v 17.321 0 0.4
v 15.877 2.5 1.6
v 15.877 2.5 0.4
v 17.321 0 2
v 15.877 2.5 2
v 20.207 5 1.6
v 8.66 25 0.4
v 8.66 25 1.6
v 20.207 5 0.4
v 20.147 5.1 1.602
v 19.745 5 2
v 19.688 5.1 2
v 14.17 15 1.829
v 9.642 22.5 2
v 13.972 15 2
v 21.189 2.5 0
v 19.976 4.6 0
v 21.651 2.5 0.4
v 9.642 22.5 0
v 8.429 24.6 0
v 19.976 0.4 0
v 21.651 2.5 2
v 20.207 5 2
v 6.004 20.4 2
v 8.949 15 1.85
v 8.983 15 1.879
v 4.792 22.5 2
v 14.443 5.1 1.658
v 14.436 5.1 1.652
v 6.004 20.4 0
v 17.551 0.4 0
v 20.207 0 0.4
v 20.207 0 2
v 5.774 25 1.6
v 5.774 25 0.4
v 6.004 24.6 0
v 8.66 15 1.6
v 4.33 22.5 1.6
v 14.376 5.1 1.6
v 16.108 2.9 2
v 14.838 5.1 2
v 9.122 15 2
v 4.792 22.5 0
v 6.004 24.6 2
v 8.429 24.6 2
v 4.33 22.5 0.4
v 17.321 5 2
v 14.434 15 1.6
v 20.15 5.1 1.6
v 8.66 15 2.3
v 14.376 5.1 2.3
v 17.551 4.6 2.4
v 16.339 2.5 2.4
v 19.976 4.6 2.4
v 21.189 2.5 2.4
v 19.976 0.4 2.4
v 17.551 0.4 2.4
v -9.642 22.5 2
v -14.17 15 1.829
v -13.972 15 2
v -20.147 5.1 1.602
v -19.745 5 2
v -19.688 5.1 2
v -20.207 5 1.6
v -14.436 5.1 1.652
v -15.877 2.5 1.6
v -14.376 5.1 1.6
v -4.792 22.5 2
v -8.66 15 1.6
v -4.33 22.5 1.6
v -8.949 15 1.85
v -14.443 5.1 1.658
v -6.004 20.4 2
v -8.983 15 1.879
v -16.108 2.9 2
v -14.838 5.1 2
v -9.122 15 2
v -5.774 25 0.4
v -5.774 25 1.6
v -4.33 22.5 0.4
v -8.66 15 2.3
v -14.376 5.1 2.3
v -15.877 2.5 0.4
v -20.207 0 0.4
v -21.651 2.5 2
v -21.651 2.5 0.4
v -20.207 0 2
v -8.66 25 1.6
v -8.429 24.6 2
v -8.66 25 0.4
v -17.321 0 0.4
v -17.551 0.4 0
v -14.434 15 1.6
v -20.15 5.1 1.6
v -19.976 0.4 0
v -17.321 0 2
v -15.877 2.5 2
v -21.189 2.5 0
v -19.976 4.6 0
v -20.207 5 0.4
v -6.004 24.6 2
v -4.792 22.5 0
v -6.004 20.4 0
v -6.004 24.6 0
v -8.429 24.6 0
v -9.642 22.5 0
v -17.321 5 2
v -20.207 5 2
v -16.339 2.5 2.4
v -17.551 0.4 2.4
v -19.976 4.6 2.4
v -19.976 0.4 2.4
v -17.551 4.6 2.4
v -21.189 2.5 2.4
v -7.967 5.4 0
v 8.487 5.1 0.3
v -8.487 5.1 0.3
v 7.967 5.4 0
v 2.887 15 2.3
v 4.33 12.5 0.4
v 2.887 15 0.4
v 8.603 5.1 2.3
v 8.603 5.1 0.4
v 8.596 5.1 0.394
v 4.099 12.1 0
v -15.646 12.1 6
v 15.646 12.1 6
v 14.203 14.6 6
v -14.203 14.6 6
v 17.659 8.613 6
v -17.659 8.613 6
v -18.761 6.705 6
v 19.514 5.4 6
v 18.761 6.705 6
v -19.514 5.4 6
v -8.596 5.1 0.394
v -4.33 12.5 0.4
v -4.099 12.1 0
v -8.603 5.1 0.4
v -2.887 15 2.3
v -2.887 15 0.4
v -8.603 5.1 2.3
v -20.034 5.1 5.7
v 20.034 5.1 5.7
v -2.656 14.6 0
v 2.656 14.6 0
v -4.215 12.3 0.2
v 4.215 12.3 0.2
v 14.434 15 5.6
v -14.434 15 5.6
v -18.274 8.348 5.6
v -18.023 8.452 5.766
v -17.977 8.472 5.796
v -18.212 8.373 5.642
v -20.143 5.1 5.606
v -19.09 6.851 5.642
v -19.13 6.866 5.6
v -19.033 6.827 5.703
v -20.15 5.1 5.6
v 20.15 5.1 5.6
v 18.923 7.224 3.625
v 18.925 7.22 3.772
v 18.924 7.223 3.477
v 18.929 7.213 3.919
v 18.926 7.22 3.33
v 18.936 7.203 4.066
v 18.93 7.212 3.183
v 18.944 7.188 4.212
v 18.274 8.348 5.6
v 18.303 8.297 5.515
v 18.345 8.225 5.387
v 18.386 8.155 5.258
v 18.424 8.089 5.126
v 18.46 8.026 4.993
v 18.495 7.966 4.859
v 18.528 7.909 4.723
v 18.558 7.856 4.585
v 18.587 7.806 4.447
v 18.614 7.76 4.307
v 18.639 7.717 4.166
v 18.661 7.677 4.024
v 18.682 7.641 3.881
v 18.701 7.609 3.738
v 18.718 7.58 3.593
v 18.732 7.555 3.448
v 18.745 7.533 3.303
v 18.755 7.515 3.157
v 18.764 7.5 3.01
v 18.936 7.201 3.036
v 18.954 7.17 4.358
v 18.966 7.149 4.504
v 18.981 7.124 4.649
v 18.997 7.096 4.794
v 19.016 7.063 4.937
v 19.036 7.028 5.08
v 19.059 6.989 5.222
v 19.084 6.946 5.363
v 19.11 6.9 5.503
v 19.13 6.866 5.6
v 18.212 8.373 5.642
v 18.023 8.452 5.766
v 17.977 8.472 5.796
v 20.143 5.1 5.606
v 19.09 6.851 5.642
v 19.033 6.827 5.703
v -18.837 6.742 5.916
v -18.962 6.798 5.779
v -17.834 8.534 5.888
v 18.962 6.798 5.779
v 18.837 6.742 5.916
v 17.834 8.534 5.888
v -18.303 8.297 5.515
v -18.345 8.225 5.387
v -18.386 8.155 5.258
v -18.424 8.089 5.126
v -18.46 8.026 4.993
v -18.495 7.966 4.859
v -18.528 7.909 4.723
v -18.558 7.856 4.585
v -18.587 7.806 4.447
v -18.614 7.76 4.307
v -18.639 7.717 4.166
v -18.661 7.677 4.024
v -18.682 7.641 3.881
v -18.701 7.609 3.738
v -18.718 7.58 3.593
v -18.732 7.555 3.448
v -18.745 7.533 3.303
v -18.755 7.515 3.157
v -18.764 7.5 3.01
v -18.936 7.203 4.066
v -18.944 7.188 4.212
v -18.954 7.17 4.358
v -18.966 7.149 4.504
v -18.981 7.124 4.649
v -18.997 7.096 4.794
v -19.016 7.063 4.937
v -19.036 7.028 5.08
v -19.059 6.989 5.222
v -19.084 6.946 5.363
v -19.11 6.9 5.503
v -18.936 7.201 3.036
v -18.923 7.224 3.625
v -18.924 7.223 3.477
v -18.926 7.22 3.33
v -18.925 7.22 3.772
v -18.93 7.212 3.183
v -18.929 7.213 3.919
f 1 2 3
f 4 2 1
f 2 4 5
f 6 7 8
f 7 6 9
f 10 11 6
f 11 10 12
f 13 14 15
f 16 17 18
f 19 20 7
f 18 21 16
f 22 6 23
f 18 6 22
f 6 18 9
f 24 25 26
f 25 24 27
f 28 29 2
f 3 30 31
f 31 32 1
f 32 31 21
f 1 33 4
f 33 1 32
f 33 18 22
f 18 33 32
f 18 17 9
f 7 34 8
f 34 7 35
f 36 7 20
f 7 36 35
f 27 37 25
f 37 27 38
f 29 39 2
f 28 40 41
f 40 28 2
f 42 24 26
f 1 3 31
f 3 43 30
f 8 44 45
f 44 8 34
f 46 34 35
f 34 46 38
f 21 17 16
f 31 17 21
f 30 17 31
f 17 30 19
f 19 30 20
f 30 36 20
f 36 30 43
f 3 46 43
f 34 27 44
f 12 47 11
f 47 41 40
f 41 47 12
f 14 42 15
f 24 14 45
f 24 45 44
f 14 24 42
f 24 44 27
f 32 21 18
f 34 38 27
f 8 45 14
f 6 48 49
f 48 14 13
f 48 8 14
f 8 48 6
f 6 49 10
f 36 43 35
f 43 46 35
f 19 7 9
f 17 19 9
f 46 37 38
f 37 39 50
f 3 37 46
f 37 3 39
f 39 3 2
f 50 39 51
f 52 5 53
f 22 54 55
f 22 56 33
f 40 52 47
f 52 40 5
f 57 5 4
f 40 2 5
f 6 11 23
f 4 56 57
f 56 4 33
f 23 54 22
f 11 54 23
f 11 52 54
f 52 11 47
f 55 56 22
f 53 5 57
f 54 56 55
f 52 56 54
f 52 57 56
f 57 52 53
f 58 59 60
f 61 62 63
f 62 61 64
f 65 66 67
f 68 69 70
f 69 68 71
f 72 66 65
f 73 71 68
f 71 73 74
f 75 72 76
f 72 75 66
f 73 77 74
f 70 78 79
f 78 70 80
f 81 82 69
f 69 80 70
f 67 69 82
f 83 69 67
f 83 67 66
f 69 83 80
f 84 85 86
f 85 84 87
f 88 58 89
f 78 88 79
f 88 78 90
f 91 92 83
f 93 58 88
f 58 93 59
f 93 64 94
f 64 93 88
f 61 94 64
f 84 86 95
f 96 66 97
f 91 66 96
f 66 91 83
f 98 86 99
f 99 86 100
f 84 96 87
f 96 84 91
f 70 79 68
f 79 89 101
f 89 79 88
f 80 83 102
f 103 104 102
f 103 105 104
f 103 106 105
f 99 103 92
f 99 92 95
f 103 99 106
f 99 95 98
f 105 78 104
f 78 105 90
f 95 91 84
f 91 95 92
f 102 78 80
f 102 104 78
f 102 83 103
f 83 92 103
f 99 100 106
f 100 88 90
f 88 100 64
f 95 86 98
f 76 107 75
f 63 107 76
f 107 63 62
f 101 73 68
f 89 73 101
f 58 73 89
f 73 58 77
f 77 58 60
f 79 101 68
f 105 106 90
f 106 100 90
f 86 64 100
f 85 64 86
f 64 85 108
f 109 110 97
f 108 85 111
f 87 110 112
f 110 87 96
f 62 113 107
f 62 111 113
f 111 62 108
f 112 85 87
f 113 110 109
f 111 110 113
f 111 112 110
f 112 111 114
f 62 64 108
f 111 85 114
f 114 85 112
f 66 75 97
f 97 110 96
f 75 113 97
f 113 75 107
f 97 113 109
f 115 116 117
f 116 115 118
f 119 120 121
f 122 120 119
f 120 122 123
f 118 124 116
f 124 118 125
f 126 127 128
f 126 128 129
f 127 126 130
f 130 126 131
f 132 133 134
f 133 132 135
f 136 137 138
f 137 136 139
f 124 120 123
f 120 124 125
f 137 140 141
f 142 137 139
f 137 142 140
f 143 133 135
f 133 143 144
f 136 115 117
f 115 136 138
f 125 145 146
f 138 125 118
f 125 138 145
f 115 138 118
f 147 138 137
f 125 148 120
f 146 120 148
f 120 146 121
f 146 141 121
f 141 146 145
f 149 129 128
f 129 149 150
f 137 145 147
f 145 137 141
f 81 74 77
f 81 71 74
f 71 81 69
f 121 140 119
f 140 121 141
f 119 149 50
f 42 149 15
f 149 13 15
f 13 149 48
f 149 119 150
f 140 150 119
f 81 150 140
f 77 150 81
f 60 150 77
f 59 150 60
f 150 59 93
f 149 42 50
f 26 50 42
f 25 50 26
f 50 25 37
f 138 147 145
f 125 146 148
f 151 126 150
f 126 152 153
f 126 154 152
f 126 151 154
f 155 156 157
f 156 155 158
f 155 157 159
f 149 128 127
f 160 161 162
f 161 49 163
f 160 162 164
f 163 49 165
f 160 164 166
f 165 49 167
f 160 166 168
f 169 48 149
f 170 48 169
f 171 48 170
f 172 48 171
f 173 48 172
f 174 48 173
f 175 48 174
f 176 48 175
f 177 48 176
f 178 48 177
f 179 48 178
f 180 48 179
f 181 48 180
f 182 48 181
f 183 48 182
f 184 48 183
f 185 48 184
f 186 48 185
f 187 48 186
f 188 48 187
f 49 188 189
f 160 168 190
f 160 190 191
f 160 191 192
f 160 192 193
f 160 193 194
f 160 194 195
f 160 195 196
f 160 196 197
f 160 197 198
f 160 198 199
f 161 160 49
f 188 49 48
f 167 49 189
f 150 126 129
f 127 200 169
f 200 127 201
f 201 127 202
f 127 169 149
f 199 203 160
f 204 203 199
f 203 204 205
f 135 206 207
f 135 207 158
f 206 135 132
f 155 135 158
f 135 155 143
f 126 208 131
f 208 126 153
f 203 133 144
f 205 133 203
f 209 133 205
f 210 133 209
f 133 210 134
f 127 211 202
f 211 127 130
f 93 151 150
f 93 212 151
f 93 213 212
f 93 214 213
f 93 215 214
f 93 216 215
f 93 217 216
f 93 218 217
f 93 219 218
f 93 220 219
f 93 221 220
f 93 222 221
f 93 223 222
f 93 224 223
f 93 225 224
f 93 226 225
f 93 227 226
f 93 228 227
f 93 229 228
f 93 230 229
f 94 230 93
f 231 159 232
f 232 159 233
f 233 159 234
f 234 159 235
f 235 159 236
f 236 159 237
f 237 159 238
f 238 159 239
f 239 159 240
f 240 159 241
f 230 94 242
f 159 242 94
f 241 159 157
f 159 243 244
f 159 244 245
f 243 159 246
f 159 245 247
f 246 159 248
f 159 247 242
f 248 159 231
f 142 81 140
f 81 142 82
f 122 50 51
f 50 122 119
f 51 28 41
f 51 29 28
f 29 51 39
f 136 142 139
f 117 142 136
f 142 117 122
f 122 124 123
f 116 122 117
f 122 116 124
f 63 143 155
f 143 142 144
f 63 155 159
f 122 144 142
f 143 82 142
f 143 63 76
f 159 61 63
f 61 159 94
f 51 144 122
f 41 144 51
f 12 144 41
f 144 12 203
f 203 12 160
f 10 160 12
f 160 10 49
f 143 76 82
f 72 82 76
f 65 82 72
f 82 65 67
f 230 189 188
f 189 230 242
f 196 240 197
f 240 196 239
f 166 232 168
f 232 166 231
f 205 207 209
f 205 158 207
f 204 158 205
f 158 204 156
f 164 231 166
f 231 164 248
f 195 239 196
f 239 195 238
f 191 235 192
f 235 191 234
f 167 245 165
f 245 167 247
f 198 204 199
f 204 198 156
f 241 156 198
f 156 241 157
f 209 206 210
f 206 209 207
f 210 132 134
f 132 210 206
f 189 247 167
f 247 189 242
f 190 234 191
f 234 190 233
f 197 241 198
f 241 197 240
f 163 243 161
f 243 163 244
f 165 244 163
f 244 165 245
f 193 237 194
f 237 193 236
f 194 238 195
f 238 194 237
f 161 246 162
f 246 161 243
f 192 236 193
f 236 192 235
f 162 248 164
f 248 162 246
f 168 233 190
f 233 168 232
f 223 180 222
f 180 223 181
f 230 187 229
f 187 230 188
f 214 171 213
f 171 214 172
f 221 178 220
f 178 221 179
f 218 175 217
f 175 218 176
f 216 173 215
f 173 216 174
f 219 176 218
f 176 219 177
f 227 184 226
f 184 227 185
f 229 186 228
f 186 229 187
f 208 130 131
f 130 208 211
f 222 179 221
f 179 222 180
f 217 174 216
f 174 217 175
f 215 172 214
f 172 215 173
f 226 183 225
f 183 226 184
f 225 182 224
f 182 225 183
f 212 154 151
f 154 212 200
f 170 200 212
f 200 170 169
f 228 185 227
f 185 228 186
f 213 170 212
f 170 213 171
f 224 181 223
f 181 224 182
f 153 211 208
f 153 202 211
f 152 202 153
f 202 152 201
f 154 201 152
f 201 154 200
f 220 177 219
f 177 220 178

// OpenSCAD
$fn=256;$fa=6;


difference() {
	union() {
		union() {
			hull() {
				union() {
					translate(v = [-18.7638837487, 2.5000000000, 0]) {
						translate(v = [0, 0, 1.0000000000]) {
							hull() {
								hull() {
									rotate(a = [0, 0, 0]) {
										cube(center = true, size = [2.886751345948129, 5, 1.2000000000]);
									}
									rotate(a = [0, 0, 120]) {
										cube(center = true, size = [2.886751345948129, 5, 1.2000000000]);
									}
									rotate(a = [0, 0, 240]) {
										cube(center = true, size = [2.886751345948129, 5, 1.2000000000]);
									}
								}
								hull() {
									rotate(a = [0, 0, 0]) {
										cube(center = true, size = [2.424871130596429, 4.2000000000, 2]);
									}
									rotate(a = [0, 0, 120]) {
										cube(center = true, size = [2.424871130596429, 4.2000000000, 2]);
									}
									rotate(a = [0, 0, 240]) {
										cube(center = true, size = [2.424871130596429, 4.2000000000, 2]);
									}
								}
							}
						}
					}
					translate(v = [-7.2168783649, 22.5000000000, 0]) {
						translate(v = [0, 0, 1.0000000000]) {
							hull() {
								hull() {
									rotate(a = [0, 0, 0]) {
										cube(center = true, size = [2.886751345948129, 5, 1.2000000000]);
									}
									rotate(a = [0, 0, 120]) {
										cube(center = true, size = [2.886751345948129, 5, 1.2000000000]);
									}
									rotate(a = [0, 0, 240]) {
										cube(center = true, size = [2.886751345948129, 5, 1.2000000000]);
									}
								}
								hull() {
									rotate(a = [0, 0, 0]) {
										cube(center = true, size = [2.424871130596429, 4.2000000000, 2]);
									}
									rotate(a = [0, 0, 120]) {
										cube(center = true, size = [2.424871130596429, 4.2000000000, 2]);
									}
									rotate(a = [0, 0, 240]) {
										cube(center = true, size = [2.424871130596429, 4.2000000000, 2]);
									}
								}
							}
						}
					}
				}
			}
			translate(v = [0, 0, 0.4000000000]) {
				translate(v = [-18.7638837487, 2.5000000000, 0]) {
					translate(v = [0, 0, 1.0000000000]) {
						hull() {
							hull() {
								rotate(a = [0, 0, 0]) {
									cube(center = true, size = [2.886751345948129, 5, 1.2000000000]);
								}
								rotate(a = [0, 0, 120]) {
									cube(center = true, size = [2.886751345948129, 5, 1.2000000000]);
								}
								rotate(a = [0, 0, 240]) {
									cube(center = true, size = [2.886751345948129, 5, 1.2000000000]);
								}
							}
							hull() {
								rotate(a = [0, 0, 0]) {
									cube(center = true, size = [2.424871130596429, 4.2000000000, 2]);
								}
								rotate(a = [0, 0, 120]) {
									cube(center = true, size = [2.424871130596429, 4.2000000000, 2]);
								}
								rotate(a = [0, 0, 240]) {
									cube(center = true, size = [2.424871130596429, 4.2000000000, 2]);
								}
							}
						}
					}
				}
			}
			union() {
				hull() {
					union() {
						translate(v = [18.7638837487, 2.5000000000, 0]) {
							translate(v = [0, 0, 1.0000000000]) {
								hull() {
									hull() {
										rotate(a = [0, 0, 0]) {
											cube(center = true, size = [2.886751345948129, 5, 1.2000000000]);
										}
										rotate(a = [0, 0, 120]) {
											cube(center = true, size = [2.886751345948129, 5, 1.2000000000]);
										}
										rotate(a = [0, 0, 240]) {
											cube(center = true, size = [2.886751345948129, 5, 1.2000000000]);
										}
									}
									hull() {
										rotate(a = [0, 0, 0]) {
											cube(center = true, size = [2.424871130596429, 4.2000000000, 2]);
										}
										rotate(a = [0, 0, 120]) {
											cube(center = true, size = [2.424871130596429, 4.2000000000, 2]);
										}
										rotate(a = [0, 0, 240]) {
											cube(center = true, size = [2.424871130596429, 4.2000000000, 2]);
										}
									}
								}
							}
						}
						translate(v = [7.2168783649, 22.5000000000, 0]) {
							translate(v = [0, 0, 1.0000000000]) {
								hull() {
									hull() {
										rotate(a = [0, 0, 0]) {
											cube(center = true, size = [2.886751345948129, 5, 1.2000000000]);
										}
										rotate(a = [0, 0, 120]) {
											cube(center = true, size = [2.886751345948129, 5, 1.2000000000]);
										}
										rotate(a = [0, 0, 240]) {
											cube(center = true, size = [2.886751345948129, 5, 1.2000000000]);
										}
									}
									hull() {
										rotate(a = [0, 0, 0]) {
											cube(center = true, size = [2.424871130596429, 4.2000000000, 2]);
										}
										rotate(a = [0, 0, 120]) {
											cube(center = true, size = [2.424871130596429, 4.2000000000, 2]);
										}
										rotate(a = [0, 0, 240]) {
											cube(center = true, size = [2.424871130596429, 4.2000000000, 2]);
										}
									}
								}
							}
						}
					}
				}
				translate(v = [0, 0, 0.4000000000]) {
					translate(v = [18.7638837487, 2.5000000000, 0]) {
						translate(v = [0, 0, 1.0000000000]) {
							hull() {
								hull() {
									rotate(a = [0, 0, 0]) {
										cube(center = true, size = [2.886751345948129, 5, 1.2000000000]);
									}
									rotate(a = [0, 0, 120]) {
										cube(center = true, size = [2.886751345948129, 5, 1.2000000000]);
									}
									rotate(a = [0, 0, 240]) {
										cube(center = true, size = [2.886751345948129, 5, 1.2000000000]);
									}
								}
								hull() {
									rotate(a = [0, 0, 0]) {
										cube(center = true, size = [2.424871130596429, 4.2000000000, 2]);
									}
									rotate(a = [0, 0, 120]) {
										cube(center = true, size = [2.424871130596429, 4.2000000000, 2]);
									}
									rotate(a = [0, 0, 240]) {
										cube(center = true, size = [2.424871130596429, 4.2000000000, 2]);
									}
								}
							}
						}
					}
				}
			}
		}
		intersection() {
			union() {
				intersection() {
					hull() {
						translate(v = [-11.5470053838, 0, 0]) {
							union() {
								translate(v = [0, 5, 3.0000000000]) {
									hull() {
										intersection() {
											hull() {
												rotate(a = [0, 0, 0]) {
													cube(center = true, size = [8.660254037844387, 15, 5.2000000000]);
												}
												rotate(a = [0, 0, 120]) {
													cube(center = true, size = [8.660254037844387, 15, 5.2000000000]);
												}
												rotate(a = [0, 0, 240]) {
													cube(center = true, size = [8.660254037844387, 15, 5.2000000000]);
												}
											}
											translate(v = [0, 15.0000000000, 0]) {
												cube(center = true, size = 30);
											}
										}
										intersection() {
											hull() {
												rotate(a = [0, 0, 0]) {
													cube(center = true, size = [8.198373822492687, 14.2000000000, 6]);
												}
												rotate(a = [0, 0, 120]) {
													cube(center = true, size = [8.198373822492687, 14.2000000000, 6]);
												}
												rotate(a = [0, 0, 240]) {
													cube(center = true, size = [8.198373822492687, 14.2000000000, 6]);
												}
											}
											translate(v = [0, 15.4000000000, 0]) {
												cube(center = true, size = 30);
											}
										}
									}
								}
								translate(v = [0, 10, 3.0000000000]) {
									hull() {
										intersection() {
											hull() {
												rotate(a = [0, 0, 0]) {
													cube(center = true, size = [5.773502691896258, 10.0000000000, 5.2000000000]);
												}
												rotate(a = [0, 0, 120]) {
													cube(center = true, size = [5.773502691896258, 10.0000000000, 5.2000000000]);
												}
												rotate(a = [0, 0, 240]) {
													cube(center = true, size = [5.773502691896258, 10.0000000000, 5.2000000000]);
												}
											}
											translate(v = [0, 10.0000000000, 0]) {
												cube(center = true, size = 20.0000000000);
											}
										}
										intersection() {
											hull() {
												rotate(a = [0, 0, 0]) {
													cube(center = true, size = [5.311622476544557, 9.2000000000, 6]);
												}
												rotate(a = [0, 0, 120]) {
													cube(center = true, size = [5.311622476544557, 9.2000000000, 6]);
												}
												rotate(a = [0, 0, 240]) {
													cube(center = true, size = [5.311622476544557, 9.2000000000, 6]);
												}
											}
											translate(v = [0, 10.4000000000, 0]) {
												cube(center = true, size = 20.0000000000);
											}
										}
									}
								}
							}
						}
						translate(v = [11.5470053838, 0, 0]) {
							union() {
								translate(v = [0, 5, 3.0000000000]) {
									hull() {
										intersection() {
											hull() {
												rotate(a = [0, 0, 0]) {
													cube(center = true, size = [8.660254037844387, 15, 5.2000000000]);
												}
												rotate(a = [0, 0, 120]) {
													cube(center = true, size = [8.660254037844387, 15, 5.2000000000]);
												}
												rotate(a = [0, 0, 240]) {
													cube(center = true, size = [8.660254037844387, 15, 5.2000000000]);
												}
											}
											translate(v = [0, 15.0000000000, 0]) {
												cube(center = true, size = 30);
											}
										}
										intersection() {
											hull() {
												rotate(a = [0, 0, 0]) {
													cube(center = true, size = [8.198373822492687, 14.2000000000, 6]);
												}
												rotate(a = [0, 0, 120]) {
													cube(center = true, size = [8.198373822492687, 14.2000000000, 6]);
												}
												rotate(a = [0, 0, 240]) {
													cube(center = true, size = [8.198373822492687, 14.2000000000, 6]);
												}
											}
											translate(v = [0, 15.4000000000, 0]) {
												cube(center = true, size = 30);
											}
										}
									}
								}
								translate(v = [0, 10, 3.0000000000]) {
									hull() {
										intersection() {
											hull() {
												rotate(a = [0, 0, 0]) {
													cube(center = true, size = [5.773502691896258, 10.0000000000, 5.2000000000]);
												}
												rotate(a = [0, 0, 120]) {
													cube(center = true, size = [5.773502691896258, 10.0000000000, 5.2000000000]);
												}
												rotate(a = [0, 0, 240]) {
													cube(center = true, size = [5.773502691896258, 10.0000000000, 5.2000000000]);
												}
											}
											translate(v = [0, 10.0000000000, 0]) {
												cube(center = true, size = 20.0000000000);
											}
										}
										intersection() {
											hull() {
												rotate(a = [0, 0, 0]) {
													cube(center = true, size = [5.311622476544557, 9.2000000000, 6]);
												}
												rotate(a = [0, 0, 120]) {
													cube(center = true, size = [5.311622476544557, 9.2000000000, 6]);
												}
												rotate(a = [0, 0, 240]) {
													cube(center = true, size = [5.311622476544557, 9.2000000000, 6]);
												}
											}
											translate(v = [0, 10.4000000000, 0]) {
												cube(center = true, size = 20.0000000000);
											}
										}
									}
								}
							}
						}
					}
					translate(v = [0, 0, 32.3000000000]) {
						cube(center = true, size = 60);
					}
				}
				union() {
					translate(v = [0, 5, 3.0000000000]) {
						hull() {
							intersection() {
								hull() {
									rotate(a = [0, 0, 0]) {
										cube(center = true, size = [8.660254037844387, 15, 5.2000000000]);
									}
									rotate(a = [0, 0, 120]) {
										cube(center = true, size = [8.660254037844387, 15, 5.2000000000]);
									}
									rotate(a = [0, 0, 240]) {
										cube(center = true, size = [8.660254037844387, 15, 5.2000000000]);
									}
								}
								translate(v = [0, 15.0000000000, 0]) {
									cube(center = true, size = 30);
								}
							}
							intersection() {
								hull() {
									rotate(a = [0, 0, 0]) {
										cube(center = true, size = [8.198373822492687, 14.2000000000, 6]);
									}
									rotate(a = [0, 0, 120]) {
										cube(center = true, size = [8.198373822492687, 14.2000000000, 6]);
									}
									rotate(a = [0, 0, 240]) {
										cube(center = true, size = [8.198373822492687, 14.2000000000, 6]);
									}
								}
								translate(v = [0, 15.4000000000, 0]) {
									cube(center = true, size = 30);
								}
							}
						}
					}
					translate(v = [0, 10, 3.0000000000]) {
						hull() {
							intersection() {
								hull() {
									rotate(a = [0, 0, 0]) {
										cube(center = true, size = [5.773502691896258, 10.0000000000, 5.2000000000]);
									}
									rotate(a = [0, 0, 120]) {
										cube(center = true, size = [5.773502691896258, 10.0000000000, 5.2000000000]);
									}
									rotate(a = [0, 0, 240]) {
										cube(center = true, size = [5.773502691896258, 10.0000000000, 5.2000000000]);
									}
								}
								translate(v = [0, 10.0000000000, 0]) {
									cube(center = true, size = 20.0000000000);
								}
							}
							intersection() {
								hull() {
									rotate(a = [0, 0, 0]) {
										cube(center = true, size = [5.311622476544557, 9.2000000000, 6]);
									}
									rotate(a = [0, 0, 120]) {
										cube(center = true, size = [5.311622476544557, 9.2000000000, 6]);
									}
									rotate(a = [0, 0, 240]) {
										cube(center = true, size = [5.311622476544557, 9.2000000000, 6]);
									}
								}
								translate(v = [0, 10.4000000000, 0]) {
									cube(center = true, size = 20.0000000000);
								}
							}
						}
					}
				}
				translate(v = [0, 0, 1.0000000000]) {
					intersection() {
						translate(v = [0, 0, -2]) {
							union() {
								intersection() {
									hull() {
										translate(v = [-11.5470053838, 0, 0]) {
											union() {
												translate(v = [0, 5, 3.0000000000]) {
													hull() {
														intersection() {
															hull() {
																rotate(a = [0, 0, 0]) {
																	cube(center = true, size = [8.660254037844387, 15, 5.2000000000]);
																}
																rotate(a = [0, 0, 120]) {
																	cube(center = true, size = [8.660254037844387, 15, 5.2000000000]);
																}
																rotate(a = [0, 0, 240]) {
																	cube(center = true, size = [8.660254037844387, 15, 5.2000000000]);
																}
															}
															translate(v = [0, 15.0000000000, 0]) {
																cube(center = true, size = 30);
															}
														}
														intersection() {
															hull() {
																rotate(a = [0, 0, 0]) {
																	cube(center = true, size = [8.198373822492687, 14.2000000000, 6]);
																}
																rotate(a = [0, 0, 120]) {
																	cube(center = true, size = [8.198373822492687, 14.2000000000, 6]);
																}
																rotate(a = [0, 0, 240]) {
																	cube(center = true, size = [8.198373822492687, 14.2000000000, 6]);
																}
															}
															translate(v = [0, 15.4000000000, 0]) {
																cube(center = true, size = 30);
															}
														}
													}
												}
												translate(v = [0, 10, 3.0000000000]) {
													hull() {
														intersection() {
															hull() {
																rotate(a = [0, 0, 0]) {
																	cube(center = true, size = [5.773502691896258, 10.0000000000, 5.2000000000]);
																}
																rotate(a = [0, 0, 120]) {
																	cube(center = true, size = [5.773502691896258, 10.0000000000, 5.2000000000]);
																}
																rotate(a = [0, 0, 240]) {
																	cube(center = true, size = [5.773502691896258, 10.0000000000, 5.2000000000]);
																}
															}
															translate(v = [0, 10.0000000000, 0]) {
																cube(center = true, size = 20.0000000000);
															}
														}
														intersection() {
															hull() {
																rotate(a = [0, 0, 0]) {
																	cube(center = true, size = [5.311622476544557, 9.2000000000, 6]);
																}
																rotate(a = [0, 0, 120]) {
																	cube(center = true, size = [5.311622476544557, 9.2000000000, 6]);
																}
																rotate(a = [0, 0, 240]) {
																	cube(center = true, size = [5.311622476544557, 9.2000000000, 6]);
																}
															}
															translate(v = [0, 10.4000000000, 0]) {
																cube(center = true, size = 20.0000000000);
															}
														}
													}
												}
											}
										}
										translate(v = [11.5470053838, 0, 0]) {
											union() {
												translate(v = [0, 5, 3.0000000000]) {
													hull() {
														intersection() {
															hull() {
																rotate(a = [0, 0, 0]) {
																	cube(center = true, size = [8.660254037844387, 15, 5.2000000000]);
																}
																rotate(a = [0, 0, 120]) {
																	cube(center = true, size = [8.660254037844387, 15, 5.2000000000]);
																}
																rotate(a = [0, 0, 240]) {
																	cube(center = true, size = [8.660254037844387, 15, 5.2000000000]);
																}
															}
															translate(v = [0, 15.0000000000, 0]) {
																cube(center = true, size = 30);
															}
														}
														intersection() {
															hull() {
																rotate(a = [0, 0, 0]) {
																	cube(center = true, size = [8.198373822492687, 14.2000000000, 6]);
																}
																rotate(a = [0, 0, 120]) {
																	cube(center = true, size = [8.198373822492687, 14.2000000000, 6]);
																}
																rotate(a = [0, 0, 240]) {
																	cube(center = true, size = [8.198373822492687, 14.2000000000, 6]);
																}
															}
															translate(v = [0, 15.4000000000, 0]) {
																cube(center = true, size = 30);
															}
														}
													}
												}
												translate(v = [0, 10, 3.0000000000]) {
													hull() {
														intersection() {
															hull() {
																rotate(a = [0, 0, 0]) {
																	cube(center = true, size = [5.773502691896258, 10.0000000000, 5.2000000000]);
																}
																rotate(a = [0, 0, 120]) {
																	cube(center = true, size = [5.773502691896258, 10.0000000000, 5.2000000000]);
																}
																rotate(a = [0, 0, 240]) {
																	cube(center = true, size = [5.773502691896258, 10.0000000000, 5.2000000000]);
																}
															}
															translate(v = [0, 10.0000000000, 0]) {
																cube(center = true, size = 20.0000000000);
															}
														}
														intersection() {
															hull() {
																rotate(a = [0, 0, 0]) {
																	cube(center = true, size = [5.311622476544557, 9.2000000000, 6]);
																}
																rotate(a = [0, 0, 120]) {
																	cube(center = true, size = [5.311622476544557, 9.2000000000, 6]);
																}
																rotate(a = [0, 0, 240]) {
																	cube(center = true, size = [5.311622476544557, 9.2000000000, 6]);
																}
															}
															translate(v = [0, 10.4000000000, 0]) {
																cube(center = true, size = 20.0000000000);
															}
														}
													}
												}
											}
										}
									}
									translate(v = [0, 0, 32.3000000000]) {
										cube(center = true, size = 60);
									}
								}
								union() {
									translate(v = [0, 5, 3.0000000000]) {
										hull() {
											intersection() {
												hull() {
													rotate(a = [0, 0, 0]) {
														cube(center = true, size = [8.660254037844387, 15, 5.2000000000]);
													}
													rotate(a = [0, 0, 120]) {
														cube(center = true, size = [8.660254037844387, 15, 5.2000000000]);
													}
													rotate(a = [0, 0, 240]) {
														cube(center = true, size = [8.660254037844387, 15, 5.2000000000]);
													}
												}
												translate(v = [0, 15.0000000000, 0]) {
													cube(center = true, size = 30);
												}
											}
											intersection() {
												hull() {
													rotate(a = [0, 0, 0]) {
														cube(center = true, size = [8.198373822492687, 14.2000000000, 6]);
													}
													rotate(a = [0, 0, 120]) {
														cube(center = true, size = [8.198373822492687, 14.2000000000, 6]);
													}
													rotate(a = [0, 0, 240]) {
														cube(center = true, size = [8.198373822492687, 14.2000000000, 6]);
													}
												}
												translate(v = [0, 15.4000000000, 0]) {
													cube(center = true, size = 30);
												}
											}
										}
									}
									translate(v = [0, 10, 3.0000000000]) {
										hull() {
											intersection() {
												hull() {
													rotate(a = [0, 0, 0]) {
														cube(center = true, size = [5.773502691896258, 10.0000000000, 5.2000000000]);
													}
													rotate(a = [0, 0, 120]) {
														cube(center = true, size = [5.773502691896258, 10.0000000000, 5.2000000000]);
													}
													rotate(a = [0, 0, 240]) {
														cube(center = true, size = [5.773502691896258, 10.0000000000, 5.2000000000]);
													}
												}
												translate(v = [0, 10.0000000000, 0]) {
													cube(center = true, size = 20.0000000000);
												}
											}
											intersection() {
												hull() {
													rotate(a = [0, 0, 0]) {
														cube(center = true, size = [5.311622476544557, 9.2000000000, 6]);
													}
													rotate(a = [0, 0, 120]) {
														cube(center = true, size = [5.311622476544557, 9.2000000000, 6]);
													}
													rotate(a = [0, 0, 240]) {
														cube(center = true, size = [5.311622476544557, 9.2000000000, 6]);
													}
												}
												translate(v = [0, 10.4000000000, 0]) {
													cube(center = true, size = 20.0000000000);
												}
											}
										}
									}
								}
							}
						}
						union() {
							hull() {
								union() {
									translate(v = [-18.7638837487, 2.5000000000, 0]) {
										translate(v = [0, 0, 1.0000000000]) {
											hull() {
												hull() {
													rotate(a = [0, 0, 0]) {
														cube(center = true, size = [2.886751345948129, 5, 1.2000000000]);
													}
													rotate(a = [0, 0, 120]) {
														cube(center = true, size = [2.886751345948129, 5, 1.2000000000]);
													}
													rotate(a = [0, 0, 240]) {
														cube(center = true, size = [2.886751345948129, 5, 1.2000000000]);
													}
												}
												hull() {
													rotate(a = [0, 0, 0]) {
														cube(center = true, size = [2.424871130596429, 4.2000000000, 2]);
													}
													rotate(a = [0, 0, 120]) {
														cube(center = true, size = [2.424871130596429, 4.2000000000, 2]);
													}
													rotate(a = [0, 0, 240]) {
														cube(center = true, size = [2.424871130596429, 4.2000000000, 2]);
													}
												}
											}
										}
									}
									translate(v = [-7.2168783649, 22.5000000000, 0]) {
										translate(v = [0, 0, 1.0000000000]) {
											hull() {
												hull() {
													rotate(a = [0, 0, 0]) {
														cube(center = true, size = [2.886751345948129, 5, 1.2000000000]);
													}
													rotate(a = [0, 0, 120]) {
														cube(center = true, size = [2.886751345948129, 5, 1.2000000000]);
													}
													rotate(a = [0, 0, 240]) {
														cube(center = true, size = [2.886751345948129, 5, 1.2000000000]);
													}
												}
												hull() {
													rotate(a = [0, 0, 0]) {
														cube(center = true, size = [2.424871130596429, 4.2000000000, 2]);
													}
													rotate(a = [0, 0, 120]) {
														cube(center = true, size = [2.424871130596429, 4.2000000000, 2]);
													}
													rotate(a = [0, 0, 240]) {
														cube(center = true, size = [2.424871130596429, 4.2000000000, 2]);
													}
												}
											}
										}
									}
								}
							}
							translate(v = [0, 0, 0.4000000000]) {
								translate(v = [-18.7638837487, 2.5000000000, 0]) {
									translate(v = [0, 0, 1.0000000000]) {
										hull() {
											hull() {
												rotate(a = [0, 0, 0]) {
													cube(center = true, size = [2.886751345948129, 5, 1.2000000000]);
												}
												rotate(a = [0, 0, 120]) {
													cube(center = true, size = [2.886751345948129, 5, 1.2000000000]);
												}
												rotate(a = [0, 0, 240]) {
													cube(center = true, size = [2.886751345948129, 5, 1.2000000000]);
												}
											}
											hull() {
												rotate(a = [0, 0, 0]) {
													cube(center = true, size = [2.424871130596429, 4.2000000000, 2]);
												}
												rotate(a = [0, 0, 120]) {
													cube(center = true, size = [2.424871130596429, 4.2000000000, 2]);
												}
												rotate(a = [0, 0, 240]) {
													cube(center = true, size = [2.424871130596429, 4.2000000000, 2]);
												}
											}
										}
									}
								}
							}
							union() {
								hull() {
									union() {
										translate(v = [18.7638837487, 2.5000000000, 0]) {
											translate(v = [0, 0, 1.0000000000]) {
												hull() {
													hull() {
														rotate(a = [0, 0, 0]) {
															cube(center = true, size = [2.886751345948129, 5, 1.2000000000]);
														}
														rotate(a = [0, 0, 120]) {
															cube(center = true, size = [2.886751345948129, 5, 1.2000000000]);
														}
														rotate(a = [0, 0, 240]) {
															cube(center = true, size = [2.886751345948129, 5, 1.2000000000]);
														}
													}
													hull() {
														rotate(a = [0, 0, 0]) {
															cube(center = true, size = [2.424871130596429, 4.2000000000, 2]);
														}
														rotate(a = [0, 0, 120]) {
															cube(center = true, size = [2.424871130596429, 4.2000000000, 2]);
														}
														rotate(a = [0, 0, 240]) {
															cube(center = true, size = [2.424871130596429, 4.2000000000, 2]);
														}
													}
												}
											}
										}
										translate(v = [7.2168783649, 22.5000000000, 0]) {
											translate(v = [0, 0, 1.0000000000]) {
												hull() {
													hull() {
														rotate(a = [0, 0, 0]) {
															cube(center = true, size = [2.886751345948129, 5, 1.2000000000]);
														}
														rotate(a = [0, 0, 120]) {
															cube(center = true, size = [2.886751345948129, 5, 1.2000000000]);
														}
														rotate(a = [0, 0, 240]) {
															cube(center = true, size = [2.886751345948129, 5, 1.2000000000]);
														}
													}
													hull() {
														rotate(a = [0, 0, 0]) {
															cube(center = true, size = [2.424871130596429, 4.2000000000, 2]);
														}
														rotate(a = [0, 0, 120]) {
															cube(center = true, size = [2.424871130596429, 4.2000000000, 2]);
														}
														rotate(a = [0, 0, 240]) {
															cube(center = true, size = [2.424871130596429, 4.2000000000, 2]);
														}
													}
												}
											}
										}
									}
								}
								translate(v = [0, 0, 0.4000000000]) {
									translate(v = [18.7638837487, 2.5000000000, 0]) {
										translate(v = [0, 0, 1.0000000000]) {
											hull() {
												hull() {
													rotate(a = [0, 0, 0]) {
														cube(center = true, size = [2.886751345948129, 5, 1.2000000000]);
													}
													rotate(a = [0, 0, 120]) {
														cube(center = true, size = [2.886751345948129, 5, 1.2000000000]);
													}
													rotate(a = [0, 0, 240]) {
														cube(center = true, size = [2.886751345948129, 5, 1.2000000000]);
													}
												}
												hull() {
													rotate(a = [0, 0, 0]) {
														cube(center = true, size = [2.424871130596429, 4.2000000000, 2]);
													}
													rotate(a = [0, 0, 120]) {
														cube(center = true, size = [2.424871130596429, 4.2000000000, 2]);
													}
													rotate(a = [0, 0, 240]) {
														cube(center = true, size = [2.424871130596429, 4.2000000000, 2]);
													}
												}
											}
										}
									}
								}
							}
						}
					}
				}
			}
			translate(v = [0, 505.1000000000, 0]) {
				cube(center = true, size = 1000);
			}
		}
	}
	translate(v = [0, 0, 1]) {
		translate(v = [0, 7.5000000000, 2.0100000000]) {
			rotate(a = [5, 0, 180]) {
				difference() {
					translate(v = [0, 0, 10]) {
						cube(center = true, size = [50, 3, 20]);
					}
					translate(v = [0, 6.3000000000, 0]) {
						rotate(a = [0, 90, 0]) {
							cylinder(center = true, h = 50, r = 6);
						}
					}
					translate(v = [0, -6, 0]) {
						rotate(a = [0, 90, 0]) {
							cylinder(center = true, h = 50, r = 6);
						}
					}
				}
			}
		}
	}
}
